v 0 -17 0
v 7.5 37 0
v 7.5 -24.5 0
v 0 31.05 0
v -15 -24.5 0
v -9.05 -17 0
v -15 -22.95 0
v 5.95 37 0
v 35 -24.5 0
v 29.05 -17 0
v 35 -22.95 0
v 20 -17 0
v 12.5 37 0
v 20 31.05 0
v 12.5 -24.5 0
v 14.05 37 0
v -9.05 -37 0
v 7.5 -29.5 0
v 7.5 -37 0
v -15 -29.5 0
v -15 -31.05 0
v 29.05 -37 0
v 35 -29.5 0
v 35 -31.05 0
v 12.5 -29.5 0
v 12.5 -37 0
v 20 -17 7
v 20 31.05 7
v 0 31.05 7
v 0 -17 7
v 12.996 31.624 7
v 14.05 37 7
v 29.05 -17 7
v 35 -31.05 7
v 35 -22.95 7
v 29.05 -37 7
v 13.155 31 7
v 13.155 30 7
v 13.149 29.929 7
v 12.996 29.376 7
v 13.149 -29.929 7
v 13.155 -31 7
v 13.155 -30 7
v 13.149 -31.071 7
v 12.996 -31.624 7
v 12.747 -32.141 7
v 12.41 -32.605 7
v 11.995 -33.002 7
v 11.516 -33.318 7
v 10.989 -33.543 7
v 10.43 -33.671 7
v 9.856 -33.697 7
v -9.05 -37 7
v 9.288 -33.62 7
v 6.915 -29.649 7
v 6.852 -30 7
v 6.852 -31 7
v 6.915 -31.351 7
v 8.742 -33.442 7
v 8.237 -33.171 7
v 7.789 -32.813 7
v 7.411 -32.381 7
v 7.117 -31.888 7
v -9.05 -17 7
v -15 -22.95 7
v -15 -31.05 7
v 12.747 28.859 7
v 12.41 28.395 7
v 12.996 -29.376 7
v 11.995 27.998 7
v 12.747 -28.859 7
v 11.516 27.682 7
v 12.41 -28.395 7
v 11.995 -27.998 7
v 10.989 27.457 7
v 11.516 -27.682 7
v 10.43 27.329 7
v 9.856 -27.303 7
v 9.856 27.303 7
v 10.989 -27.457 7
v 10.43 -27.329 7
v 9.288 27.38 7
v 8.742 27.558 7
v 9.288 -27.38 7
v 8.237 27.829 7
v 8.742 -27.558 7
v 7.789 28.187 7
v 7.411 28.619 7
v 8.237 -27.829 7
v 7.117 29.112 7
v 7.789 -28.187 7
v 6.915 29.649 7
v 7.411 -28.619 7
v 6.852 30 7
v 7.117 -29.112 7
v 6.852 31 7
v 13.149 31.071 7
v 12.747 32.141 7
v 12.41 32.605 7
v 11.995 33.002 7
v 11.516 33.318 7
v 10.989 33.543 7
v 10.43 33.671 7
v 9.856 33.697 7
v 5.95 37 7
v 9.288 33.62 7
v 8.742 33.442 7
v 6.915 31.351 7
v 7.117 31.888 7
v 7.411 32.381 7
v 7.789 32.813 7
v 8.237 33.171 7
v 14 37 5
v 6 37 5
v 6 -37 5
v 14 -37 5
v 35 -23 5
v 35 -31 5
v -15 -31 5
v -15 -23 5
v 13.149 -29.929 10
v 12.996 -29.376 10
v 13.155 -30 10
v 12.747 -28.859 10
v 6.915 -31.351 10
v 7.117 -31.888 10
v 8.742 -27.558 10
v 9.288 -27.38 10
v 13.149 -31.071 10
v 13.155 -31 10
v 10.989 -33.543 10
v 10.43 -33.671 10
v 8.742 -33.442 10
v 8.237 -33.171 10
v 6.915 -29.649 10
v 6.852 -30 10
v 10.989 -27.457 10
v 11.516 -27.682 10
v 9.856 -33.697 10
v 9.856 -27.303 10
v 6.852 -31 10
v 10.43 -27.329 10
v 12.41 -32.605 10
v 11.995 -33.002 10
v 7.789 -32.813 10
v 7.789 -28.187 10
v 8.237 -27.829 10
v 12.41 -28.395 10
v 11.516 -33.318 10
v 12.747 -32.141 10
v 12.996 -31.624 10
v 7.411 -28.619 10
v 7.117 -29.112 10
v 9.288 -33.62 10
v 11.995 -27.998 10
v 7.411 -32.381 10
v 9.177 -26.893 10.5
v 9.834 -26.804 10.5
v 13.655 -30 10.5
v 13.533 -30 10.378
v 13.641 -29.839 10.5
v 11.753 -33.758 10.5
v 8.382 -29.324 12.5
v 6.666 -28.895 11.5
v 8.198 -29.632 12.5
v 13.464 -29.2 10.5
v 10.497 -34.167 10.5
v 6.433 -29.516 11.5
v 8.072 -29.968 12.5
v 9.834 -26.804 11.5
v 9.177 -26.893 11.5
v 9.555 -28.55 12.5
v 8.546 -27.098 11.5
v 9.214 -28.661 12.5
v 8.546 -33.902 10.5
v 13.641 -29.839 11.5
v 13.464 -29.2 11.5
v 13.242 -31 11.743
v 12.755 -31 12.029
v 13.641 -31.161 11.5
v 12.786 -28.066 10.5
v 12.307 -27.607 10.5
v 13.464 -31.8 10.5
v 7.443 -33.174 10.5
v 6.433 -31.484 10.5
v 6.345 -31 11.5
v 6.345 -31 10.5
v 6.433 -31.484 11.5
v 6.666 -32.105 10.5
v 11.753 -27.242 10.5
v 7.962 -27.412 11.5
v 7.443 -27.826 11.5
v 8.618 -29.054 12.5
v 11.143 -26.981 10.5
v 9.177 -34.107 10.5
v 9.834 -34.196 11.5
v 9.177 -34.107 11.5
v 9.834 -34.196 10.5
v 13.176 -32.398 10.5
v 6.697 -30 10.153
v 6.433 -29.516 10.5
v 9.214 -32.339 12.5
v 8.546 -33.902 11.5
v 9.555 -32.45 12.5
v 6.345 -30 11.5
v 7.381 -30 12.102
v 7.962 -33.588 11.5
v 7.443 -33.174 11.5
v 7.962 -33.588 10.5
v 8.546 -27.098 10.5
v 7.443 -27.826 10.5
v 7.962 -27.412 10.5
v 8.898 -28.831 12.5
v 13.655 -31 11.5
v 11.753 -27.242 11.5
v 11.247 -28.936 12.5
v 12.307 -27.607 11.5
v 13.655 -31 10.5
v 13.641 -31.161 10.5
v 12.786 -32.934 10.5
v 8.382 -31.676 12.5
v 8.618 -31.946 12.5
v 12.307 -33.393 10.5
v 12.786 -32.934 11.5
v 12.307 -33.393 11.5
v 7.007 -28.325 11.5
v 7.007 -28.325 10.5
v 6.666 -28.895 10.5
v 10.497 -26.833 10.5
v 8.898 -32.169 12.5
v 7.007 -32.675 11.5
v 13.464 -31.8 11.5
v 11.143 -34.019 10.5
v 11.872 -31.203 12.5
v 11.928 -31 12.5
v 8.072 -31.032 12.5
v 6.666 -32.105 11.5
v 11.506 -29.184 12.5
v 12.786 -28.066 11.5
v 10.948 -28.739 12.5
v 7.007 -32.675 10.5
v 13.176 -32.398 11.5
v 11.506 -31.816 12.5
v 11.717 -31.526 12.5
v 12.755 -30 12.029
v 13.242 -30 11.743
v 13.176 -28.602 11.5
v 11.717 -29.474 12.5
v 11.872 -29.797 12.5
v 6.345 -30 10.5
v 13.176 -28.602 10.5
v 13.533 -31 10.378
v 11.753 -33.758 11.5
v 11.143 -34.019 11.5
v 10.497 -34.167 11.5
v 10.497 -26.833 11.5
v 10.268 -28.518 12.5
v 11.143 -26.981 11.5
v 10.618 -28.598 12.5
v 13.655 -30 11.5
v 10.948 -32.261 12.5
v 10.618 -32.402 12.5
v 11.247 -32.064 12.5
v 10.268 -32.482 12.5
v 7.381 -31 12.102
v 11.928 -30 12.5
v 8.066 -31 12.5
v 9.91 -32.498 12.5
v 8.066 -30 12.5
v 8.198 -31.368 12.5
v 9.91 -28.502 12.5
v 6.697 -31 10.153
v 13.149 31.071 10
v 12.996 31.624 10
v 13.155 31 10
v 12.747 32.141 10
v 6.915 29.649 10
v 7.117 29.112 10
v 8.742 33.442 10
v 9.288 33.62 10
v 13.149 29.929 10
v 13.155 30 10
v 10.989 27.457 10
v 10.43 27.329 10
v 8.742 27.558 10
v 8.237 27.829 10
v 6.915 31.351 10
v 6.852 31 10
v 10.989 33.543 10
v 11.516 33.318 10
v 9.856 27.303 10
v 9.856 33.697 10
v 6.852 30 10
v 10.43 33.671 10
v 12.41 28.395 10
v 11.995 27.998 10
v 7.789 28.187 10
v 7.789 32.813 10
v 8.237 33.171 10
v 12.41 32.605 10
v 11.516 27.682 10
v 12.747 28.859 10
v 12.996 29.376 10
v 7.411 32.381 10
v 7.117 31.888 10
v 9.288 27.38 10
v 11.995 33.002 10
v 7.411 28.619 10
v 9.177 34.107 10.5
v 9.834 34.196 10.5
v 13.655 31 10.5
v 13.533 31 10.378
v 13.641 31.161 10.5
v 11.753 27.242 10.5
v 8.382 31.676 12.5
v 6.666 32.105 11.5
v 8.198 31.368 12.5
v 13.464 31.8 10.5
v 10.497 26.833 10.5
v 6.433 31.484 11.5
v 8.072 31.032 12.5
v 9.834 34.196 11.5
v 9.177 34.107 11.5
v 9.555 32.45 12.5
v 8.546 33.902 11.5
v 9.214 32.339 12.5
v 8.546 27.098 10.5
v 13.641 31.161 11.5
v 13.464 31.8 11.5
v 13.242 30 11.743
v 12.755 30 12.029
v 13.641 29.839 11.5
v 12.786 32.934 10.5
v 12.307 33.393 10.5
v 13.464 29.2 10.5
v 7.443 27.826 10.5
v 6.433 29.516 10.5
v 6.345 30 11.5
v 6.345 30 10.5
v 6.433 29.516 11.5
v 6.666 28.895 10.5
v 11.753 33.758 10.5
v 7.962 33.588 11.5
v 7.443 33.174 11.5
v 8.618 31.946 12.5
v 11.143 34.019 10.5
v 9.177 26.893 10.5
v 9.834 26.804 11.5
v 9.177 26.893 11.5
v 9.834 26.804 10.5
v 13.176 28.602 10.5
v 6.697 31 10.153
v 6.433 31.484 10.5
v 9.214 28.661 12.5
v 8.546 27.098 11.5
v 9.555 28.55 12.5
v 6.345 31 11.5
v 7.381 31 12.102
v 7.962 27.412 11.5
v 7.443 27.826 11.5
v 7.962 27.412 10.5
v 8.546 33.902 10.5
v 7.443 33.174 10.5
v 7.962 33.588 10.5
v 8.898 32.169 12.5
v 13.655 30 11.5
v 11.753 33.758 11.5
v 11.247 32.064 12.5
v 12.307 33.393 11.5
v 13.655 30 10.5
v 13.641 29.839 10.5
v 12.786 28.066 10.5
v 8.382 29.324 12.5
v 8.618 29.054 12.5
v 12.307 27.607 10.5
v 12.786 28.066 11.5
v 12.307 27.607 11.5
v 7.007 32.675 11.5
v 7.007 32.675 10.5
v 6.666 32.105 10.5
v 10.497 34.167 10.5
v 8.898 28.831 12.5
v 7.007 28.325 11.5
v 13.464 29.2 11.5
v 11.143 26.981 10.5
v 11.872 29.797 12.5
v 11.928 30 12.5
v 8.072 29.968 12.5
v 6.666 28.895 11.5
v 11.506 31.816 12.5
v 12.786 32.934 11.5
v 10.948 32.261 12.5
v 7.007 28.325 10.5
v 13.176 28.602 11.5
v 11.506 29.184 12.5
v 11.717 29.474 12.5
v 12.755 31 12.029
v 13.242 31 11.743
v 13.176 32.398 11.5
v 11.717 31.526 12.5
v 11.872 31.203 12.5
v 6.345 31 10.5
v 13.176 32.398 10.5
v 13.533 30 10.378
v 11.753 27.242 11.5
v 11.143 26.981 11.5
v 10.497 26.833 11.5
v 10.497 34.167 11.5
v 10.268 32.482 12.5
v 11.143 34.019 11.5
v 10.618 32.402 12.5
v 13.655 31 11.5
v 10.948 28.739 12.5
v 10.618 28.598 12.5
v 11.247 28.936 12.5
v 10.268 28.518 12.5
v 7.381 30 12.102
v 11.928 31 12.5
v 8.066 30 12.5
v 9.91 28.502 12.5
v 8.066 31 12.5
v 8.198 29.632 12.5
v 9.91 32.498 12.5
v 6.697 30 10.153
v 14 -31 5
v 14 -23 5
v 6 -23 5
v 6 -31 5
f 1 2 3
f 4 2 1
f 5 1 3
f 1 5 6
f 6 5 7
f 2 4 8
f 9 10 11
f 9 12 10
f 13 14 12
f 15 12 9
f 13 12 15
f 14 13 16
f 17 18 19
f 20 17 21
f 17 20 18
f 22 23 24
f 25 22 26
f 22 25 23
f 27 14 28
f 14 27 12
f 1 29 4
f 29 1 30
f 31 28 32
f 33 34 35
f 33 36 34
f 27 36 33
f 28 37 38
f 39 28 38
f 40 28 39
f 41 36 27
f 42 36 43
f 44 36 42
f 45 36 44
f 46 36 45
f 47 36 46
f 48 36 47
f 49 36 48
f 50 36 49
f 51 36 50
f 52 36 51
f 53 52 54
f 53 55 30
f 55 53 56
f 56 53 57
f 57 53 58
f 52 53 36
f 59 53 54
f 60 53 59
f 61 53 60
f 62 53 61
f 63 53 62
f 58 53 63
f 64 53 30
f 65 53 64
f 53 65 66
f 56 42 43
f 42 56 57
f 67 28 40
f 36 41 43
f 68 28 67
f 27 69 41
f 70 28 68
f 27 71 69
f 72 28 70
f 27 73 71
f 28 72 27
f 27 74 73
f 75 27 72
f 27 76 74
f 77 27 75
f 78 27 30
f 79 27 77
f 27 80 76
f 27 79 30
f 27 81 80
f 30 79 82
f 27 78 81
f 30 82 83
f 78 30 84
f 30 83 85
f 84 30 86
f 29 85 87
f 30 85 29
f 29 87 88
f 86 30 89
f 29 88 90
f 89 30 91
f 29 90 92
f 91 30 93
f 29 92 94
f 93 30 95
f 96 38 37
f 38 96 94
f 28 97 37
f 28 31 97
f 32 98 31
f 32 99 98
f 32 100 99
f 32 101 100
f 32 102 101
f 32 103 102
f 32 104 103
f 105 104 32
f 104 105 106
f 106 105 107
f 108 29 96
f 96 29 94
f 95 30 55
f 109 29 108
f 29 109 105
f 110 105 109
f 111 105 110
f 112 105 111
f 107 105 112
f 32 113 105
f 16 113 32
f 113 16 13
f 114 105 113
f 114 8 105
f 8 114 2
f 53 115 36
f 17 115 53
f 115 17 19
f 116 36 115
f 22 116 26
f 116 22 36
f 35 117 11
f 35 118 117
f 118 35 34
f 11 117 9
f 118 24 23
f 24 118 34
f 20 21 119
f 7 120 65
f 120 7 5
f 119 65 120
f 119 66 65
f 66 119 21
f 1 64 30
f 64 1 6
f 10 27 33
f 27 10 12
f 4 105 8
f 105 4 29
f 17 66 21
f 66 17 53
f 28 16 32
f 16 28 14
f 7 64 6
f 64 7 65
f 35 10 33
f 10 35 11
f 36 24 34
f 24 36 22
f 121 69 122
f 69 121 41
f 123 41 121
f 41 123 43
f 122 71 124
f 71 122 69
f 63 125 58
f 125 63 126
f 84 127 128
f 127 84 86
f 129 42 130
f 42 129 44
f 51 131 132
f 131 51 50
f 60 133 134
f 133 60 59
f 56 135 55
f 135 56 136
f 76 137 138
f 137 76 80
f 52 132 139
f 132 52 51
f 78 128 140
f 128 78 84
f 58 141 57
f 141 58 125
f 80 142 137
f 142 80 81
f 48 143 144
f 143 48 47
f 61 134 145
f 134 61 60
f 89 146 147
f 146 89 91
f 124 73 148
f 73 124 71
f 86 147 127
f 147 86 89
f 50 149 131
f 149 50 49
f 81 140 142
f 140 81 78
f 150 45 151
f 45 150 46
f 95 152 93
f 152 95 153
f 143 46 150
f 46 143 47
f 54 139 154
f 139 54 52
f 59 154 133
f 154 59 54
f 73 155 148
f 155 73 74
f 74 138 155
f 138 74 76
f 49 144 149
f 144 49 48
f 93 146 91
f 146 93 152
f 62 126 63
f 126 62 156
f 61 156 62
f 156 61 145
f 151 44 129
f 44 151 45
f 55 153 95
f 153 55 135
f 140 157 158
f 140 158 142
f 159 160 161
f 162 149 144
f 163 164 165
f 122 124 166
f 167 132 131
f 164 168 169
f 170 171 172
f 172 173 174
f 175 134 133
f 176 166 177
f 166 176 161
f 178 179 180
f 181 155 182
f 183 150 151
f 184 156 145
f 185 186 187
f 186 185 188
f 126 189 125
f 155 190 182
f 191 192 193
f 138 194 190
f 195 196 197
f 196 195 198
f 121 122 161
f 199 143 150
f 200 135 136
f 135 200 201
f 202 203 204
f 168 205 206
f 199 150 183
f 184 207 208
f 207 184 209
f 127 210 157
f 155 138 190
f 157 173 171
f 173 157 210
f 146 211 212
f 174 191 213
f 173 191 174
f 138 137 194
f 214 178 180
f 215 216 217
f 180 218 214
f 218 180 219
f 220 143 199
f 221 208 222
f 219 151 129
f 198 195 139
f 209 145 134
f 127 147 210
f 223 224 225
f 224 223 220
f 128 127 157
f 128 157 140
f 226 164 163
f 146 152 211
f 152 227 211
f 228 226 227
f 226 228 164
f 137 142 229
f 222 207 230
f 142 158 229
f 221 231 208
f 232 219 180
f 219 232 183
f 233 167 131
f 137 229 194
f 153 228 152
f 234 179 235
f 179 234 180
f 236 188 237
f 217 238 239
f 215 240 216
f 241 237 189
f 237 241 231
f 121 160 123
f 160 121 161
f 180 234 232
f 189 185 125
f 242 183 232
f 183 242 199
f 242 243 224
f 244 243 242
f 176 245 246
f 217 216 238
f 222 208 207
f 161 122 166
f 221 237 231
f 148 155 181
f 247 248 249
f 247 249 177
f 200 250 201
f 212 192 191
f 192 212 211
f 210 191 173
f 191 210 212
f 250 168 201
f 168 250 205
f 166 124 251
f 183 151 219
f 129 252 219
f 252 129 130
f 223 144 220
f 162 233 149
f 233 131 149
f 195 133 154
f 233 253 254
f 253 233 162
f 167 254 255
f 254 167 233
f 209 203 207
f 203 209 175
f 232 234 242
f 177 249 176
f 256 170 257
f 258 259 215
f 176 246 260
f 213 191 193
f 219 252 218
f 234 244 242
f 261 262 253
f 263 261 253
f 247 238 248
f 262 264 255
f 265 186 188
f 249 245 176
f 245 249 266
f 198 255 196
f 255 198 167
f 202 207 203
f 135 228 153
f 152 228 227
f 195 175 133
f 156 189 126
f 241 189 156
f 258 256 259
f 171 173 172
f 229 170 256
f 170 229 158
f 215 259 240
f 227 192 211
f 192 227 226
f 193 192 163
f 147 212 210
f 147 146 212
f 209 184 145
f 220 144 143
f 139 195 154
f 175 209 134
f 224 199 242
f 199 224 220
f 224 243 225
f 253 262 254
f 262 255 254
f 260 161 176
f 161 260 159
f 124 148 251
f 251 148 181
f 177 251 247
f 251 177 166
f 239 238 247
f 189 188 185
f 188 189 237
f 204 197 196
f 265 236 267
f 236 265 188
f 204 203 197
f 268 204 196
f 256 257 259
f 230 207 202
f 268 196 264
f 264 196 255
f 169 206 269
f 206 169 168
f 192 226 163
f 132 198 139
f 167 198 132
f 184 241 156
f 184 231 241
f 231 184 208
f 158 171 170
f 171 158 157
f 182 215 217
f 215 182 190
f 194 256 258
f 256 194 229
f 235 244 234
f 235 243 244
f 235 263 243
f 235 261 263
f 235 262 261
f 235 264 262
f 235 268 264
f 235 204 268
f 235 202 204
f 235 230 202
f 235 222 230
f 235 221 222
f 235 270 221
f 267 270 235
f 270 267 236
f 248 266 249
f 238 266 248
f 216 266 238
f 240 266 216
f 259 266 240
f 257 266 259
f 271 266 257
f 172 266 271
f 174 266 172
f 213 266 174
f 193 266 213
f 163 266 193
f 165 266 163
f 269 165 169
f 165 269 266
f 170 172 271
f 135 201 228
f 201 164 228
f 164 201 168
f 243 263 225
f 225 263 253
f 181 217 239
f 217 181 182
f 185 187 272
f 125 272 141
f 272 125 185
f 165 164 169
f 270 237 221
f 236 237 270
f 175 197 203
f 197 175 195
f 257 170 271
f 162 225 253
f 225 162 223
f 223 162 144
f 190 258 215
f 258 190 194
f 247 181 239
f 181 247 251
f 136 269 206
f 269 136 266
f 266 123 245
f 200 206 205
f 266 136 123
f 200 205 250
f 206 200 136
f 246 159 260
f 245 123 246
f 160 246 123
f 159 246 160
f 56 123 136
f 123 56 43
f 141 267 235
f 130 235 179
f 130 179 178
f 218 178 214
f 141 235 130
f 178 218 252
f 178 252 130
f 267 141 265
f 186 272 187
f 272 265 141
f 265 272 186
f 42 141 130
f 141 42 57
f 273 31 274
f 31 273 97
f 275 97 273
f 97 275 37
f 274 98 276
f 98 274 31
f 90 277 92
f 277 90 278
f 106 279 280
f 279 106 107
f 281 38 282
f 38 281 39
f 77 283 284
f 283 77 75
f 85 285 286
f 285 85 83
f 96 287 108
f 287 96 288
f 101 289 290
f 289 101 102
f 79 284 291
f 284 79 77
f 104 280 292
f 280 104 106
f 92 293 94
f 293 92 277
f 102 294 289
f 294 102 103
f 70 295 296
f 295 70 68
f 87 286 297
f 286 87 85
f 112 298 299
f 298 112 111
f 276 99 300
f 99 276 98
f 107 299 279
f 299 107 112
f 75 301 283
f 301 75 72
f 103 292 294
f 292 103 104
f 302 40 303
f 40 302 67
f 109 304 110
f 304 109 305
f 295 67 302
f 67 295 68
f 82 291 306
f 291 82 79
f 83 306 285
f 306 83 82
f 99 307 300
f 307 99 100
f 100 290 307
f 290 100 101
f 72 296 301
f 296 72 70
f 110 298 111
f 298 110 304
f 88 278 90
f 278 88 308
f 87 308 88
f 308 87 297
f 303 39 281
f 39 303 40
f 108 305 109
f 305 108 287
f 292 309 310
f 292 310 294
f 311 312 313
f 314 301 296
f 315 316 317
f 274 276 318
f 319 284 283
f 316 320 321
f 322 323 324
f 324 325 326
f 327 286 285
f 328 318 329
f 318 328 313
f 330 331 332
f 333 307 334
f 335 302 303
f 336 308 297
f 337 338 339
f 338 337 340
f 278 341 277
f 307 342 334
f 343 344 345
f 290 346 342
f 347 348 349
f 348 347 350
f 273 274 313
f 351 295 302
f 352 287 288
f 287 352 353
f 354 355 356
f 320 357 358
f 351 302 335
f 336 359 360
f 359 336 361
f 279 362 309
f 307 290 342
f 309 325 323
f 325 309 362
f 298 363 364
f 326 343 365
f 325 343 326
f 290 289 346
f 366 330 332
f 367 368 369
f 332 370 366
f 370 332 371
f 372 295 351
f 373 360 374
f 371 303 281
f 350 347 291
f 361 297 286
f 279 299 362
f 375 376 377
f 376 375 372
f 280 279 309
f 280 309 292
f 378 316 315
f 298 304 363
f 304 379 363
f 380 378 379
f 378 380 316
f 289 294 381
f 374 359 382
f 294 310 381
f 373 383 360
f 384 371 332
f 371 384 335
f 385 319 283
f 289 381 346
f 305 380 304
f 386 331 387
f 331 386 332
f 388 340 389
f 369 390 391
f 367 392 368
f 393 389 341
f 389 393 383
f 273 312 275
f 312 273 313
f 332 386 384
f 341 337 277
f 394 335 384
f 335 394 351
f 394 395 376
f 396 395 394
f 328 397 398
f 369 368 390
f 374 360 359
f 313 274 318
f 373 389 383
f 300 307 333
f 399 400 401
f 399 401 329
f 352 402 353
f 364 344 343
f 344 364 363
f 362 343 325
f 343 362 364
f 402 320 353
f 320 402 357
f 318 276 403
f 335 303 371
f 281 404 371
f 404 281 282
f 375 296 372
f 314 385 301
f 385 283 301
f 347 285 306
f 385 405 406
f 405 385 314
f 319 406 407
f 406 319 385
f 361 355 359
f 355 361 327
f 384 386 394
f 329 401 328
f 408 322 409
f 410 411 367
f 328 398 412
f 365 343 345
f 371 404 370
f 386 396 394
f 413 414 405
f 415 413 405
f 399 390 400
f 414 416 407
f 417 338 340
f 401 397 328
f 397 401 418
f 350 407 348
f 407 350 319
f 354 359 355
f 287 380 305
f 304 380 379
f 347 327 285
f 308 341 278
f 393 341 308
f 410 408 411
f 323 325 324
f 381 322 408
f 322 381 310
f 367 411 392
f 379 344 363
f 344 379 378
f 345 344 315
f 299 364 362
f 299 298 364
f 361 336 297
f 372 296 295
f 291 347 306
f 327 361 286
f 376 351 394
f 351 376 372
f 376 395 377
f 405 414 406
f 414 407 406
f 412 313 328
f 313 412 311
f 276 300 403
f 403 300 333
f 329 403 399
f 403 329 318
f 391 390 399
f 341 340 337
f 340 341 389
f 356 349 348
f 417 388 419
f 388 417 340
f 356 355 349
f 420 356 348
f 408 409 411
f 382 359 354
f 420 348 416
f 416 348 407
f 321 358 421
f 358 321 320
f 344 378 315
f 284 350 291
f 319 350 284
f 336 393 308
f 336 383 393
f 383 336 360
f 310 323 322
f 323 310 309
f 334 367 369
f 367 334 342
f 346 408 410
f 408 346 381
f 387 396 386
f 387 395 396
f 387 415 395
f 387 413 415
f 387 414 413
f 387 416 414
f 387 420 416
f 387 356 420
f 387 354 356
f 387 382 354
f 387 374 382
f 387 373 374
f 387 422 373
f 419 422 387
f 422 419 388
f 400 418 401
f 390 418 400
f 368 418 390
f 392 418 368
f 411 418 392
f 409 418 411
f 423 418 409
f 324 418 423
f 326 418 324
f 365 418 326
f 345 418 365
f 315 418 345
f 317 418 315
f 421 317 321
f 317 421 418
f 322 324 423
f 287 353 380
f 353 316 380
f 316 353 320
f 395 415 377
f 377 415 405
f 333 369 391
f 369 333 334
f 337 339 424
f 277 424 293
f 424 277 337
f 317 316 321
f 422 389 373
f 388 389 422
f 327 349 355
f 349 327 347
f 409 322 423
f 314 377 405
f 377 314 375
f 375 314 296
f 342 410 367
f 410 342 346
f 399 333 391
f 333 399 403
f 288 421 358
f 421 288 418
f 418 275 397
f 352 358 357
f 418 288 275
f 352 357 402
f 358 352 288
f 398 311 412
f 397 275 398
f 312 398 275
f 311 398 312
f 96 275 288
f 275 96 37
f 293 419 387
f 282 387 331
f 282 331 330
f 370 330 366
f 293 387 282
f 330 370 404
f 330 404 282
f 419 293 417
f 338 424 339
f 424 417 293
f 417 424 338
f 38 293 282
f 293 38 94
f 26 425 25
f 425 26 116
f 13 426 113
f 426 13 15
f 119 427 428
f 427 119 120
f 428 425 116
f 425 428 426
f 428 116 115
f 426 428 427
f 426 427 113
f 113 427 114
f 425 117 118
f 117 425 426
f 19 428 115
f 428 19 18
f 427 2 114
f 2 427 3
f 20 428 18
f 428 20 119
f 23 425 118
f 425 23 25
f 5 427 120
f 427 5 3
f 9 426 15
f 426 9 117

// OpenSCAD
// file: globals.scad
/*
Most things in this file is represented as one millimeter, so keep that in mind while changing things.
Some of the setting are not mm but at variables that you can set, such as 2*x=2x and you are setting what x is.
I will try to specify when things are variables and not exact measurements.
*/

// printer slop
slop = 0.15;

obj_leg = 30;
leg_length = 5.5;
small_number = 0.001;
metal_core_rode_global = 5;


///////////////// number of holes /////////////////////
z_hole_number = 8;
other_holes = 8;

///////////////// Pins /////////////////////

//pins that poke out
ball_size = 10;
pin_height = 20;
pin_diameter = 6;


//holes
hole_ball_size = ball_size;
hole_pin_height = pin_height;
hole_pin_diameter = pin_diameter;

///////////////// Z THINGS /////////////////////

berring_slot_width = 7.5;
berring_slot_depth = 6.5;
metal_core_rode = 5;

///////////////// X THINGS /////////////////////

//male dove tails
male_dove_max_width=8;
male_dove_min_width=5;
male_dove_depth=5;
male_dove_height=obj_leg/2;

function scaled_male_dove_max_width() = male_dove_max_width - slop;
function scaled_male_dove_min_width() = male_dove_min_width - slop;
function scaled_male_dove_depth() = male_dove_depth - slop;

//female dove tails, this is found on the y mounts
girl_max_width=11;
girl_min_width=5;
girl_depth=5;
girl_height=obj_leg;


///////////////// Y THINGS /////////////////////
/*
The Y is so normal that all of those global variables at the top should change all of the setting in it, this section is set her incase there are variables set in the future development of this project.
*/

// stepper
motor_side_length = 43.2;
motor_bolt_hole_distance = 31;
motor_center_hole = 23;
motor_shaft_dia = 5;
motor_shaft_hole_dia = 5+2*slop;

// bolts etc.
bolt_hole_dia = 3+2*slop;
bolt_head_hole_dia = 5.8;

m3_nut_side = 5.65;

// threaded rod
lifter_rod_diam = 9.86;
hole_threaded_rod = lifter_rod_diam+2*slop;
// file: long_bow_tie.scad
tilt_level = 1.1;

include <include.scad>;
include <globals.scad>;

obj_leg = 12;

max_width=scaled_male_dove_max_width();
min_width=scaled_male_dove_min_width();
depth=scaled_male_dove_depth();
length = 50;

module bow_tie_master(length){
	union(){
		mirror([0,1,0])	dovetail_3d(max_width, min_width, depth, length);
		dovetail_3d(max_width, min_width, depth, length);
	}
}

module long_bow_tie(length) {
    translate([0,0,depth]) intersection(){
        rotate([90,0,0]) bow_tie_master(length);
        rotate([90,0,0]) cylinder(r=5.8, h=200);
    }
}

long_bow_tie(length);
// main file
use <long_bow_tie.scad>;
include <include.scad>;
include <globals.scad>;

$fn=35;

module fixing_pin(pin_size=6.4) {
    difference() {
        union() {
            cylinder(3, r=pin_size/2);
            hull() {
                translate([0,0,3]) cylinder(0.5, r=pin_size/2);
                translate([0,0,3.5]) cylinder(1, r=pin_size/2+0.5);
                translate([0,0,4.5]) cylinder(1, r=2);
            }
        }
        cube([8,1,12], center=true);
    }
}

module fixing_plate(pin_distance, pin_size) {
    difference() {
        union () {
            translate([-14.5,0,10]) cube([7,74,20], center = true);
            translate([-14.5,-74/2+20/2,10]) cube([7,20,50], center = true);
        }
		union() {
			// fixing plate cutout
			translate([-16,36,0]) rotate([45,0,0]) cube([16,16,7], center = true);
			translate([-16,-35,-16]) rotate([135,0,0]) cube([16,16,7], center = true);
			translate([-16,36,20]) rotate([135,0,0]) cube([16,16,7], center = true);
			translate([-16,-19,-16]) rotate([45,0,0]) cube([16,16,7], center = true);
            
            translate([-16,-19,36]) rotate([135,0,0]) cube([16,16,7], center = true);
            translate([-16,-35,36]) rotate([45,0,0]) cube([16,16,7], center = true);
		}
	}
	translate([-18,-pin_distance/2,10]) rotate([0,270,0]) fixing_pin(pin_size);
	translate([-18,pin_distance/2,10]) rotate([0,270,0]) fixing_pin(pin_size);

}

module do_airtrippers_bowden_mount(pin_distance=61, pin_size=6.4) {
    difference() {
        translate([0,0,-11]) rotate([0,90,0]) fixing_plate(pin_distance, pin_size);
        translate([10,40,0]) rotate([90,0,0]) male_dovetail(height=80);
        translate([40,-27,0]) rotate([90,0,-90]) male_dovetail(height=80);
    }
}

do_airtrippers_bowden_mount();

// pins scaled due to wrong dimension airtrippers
//do_airtrippers_bowden_mount(59, 6);
